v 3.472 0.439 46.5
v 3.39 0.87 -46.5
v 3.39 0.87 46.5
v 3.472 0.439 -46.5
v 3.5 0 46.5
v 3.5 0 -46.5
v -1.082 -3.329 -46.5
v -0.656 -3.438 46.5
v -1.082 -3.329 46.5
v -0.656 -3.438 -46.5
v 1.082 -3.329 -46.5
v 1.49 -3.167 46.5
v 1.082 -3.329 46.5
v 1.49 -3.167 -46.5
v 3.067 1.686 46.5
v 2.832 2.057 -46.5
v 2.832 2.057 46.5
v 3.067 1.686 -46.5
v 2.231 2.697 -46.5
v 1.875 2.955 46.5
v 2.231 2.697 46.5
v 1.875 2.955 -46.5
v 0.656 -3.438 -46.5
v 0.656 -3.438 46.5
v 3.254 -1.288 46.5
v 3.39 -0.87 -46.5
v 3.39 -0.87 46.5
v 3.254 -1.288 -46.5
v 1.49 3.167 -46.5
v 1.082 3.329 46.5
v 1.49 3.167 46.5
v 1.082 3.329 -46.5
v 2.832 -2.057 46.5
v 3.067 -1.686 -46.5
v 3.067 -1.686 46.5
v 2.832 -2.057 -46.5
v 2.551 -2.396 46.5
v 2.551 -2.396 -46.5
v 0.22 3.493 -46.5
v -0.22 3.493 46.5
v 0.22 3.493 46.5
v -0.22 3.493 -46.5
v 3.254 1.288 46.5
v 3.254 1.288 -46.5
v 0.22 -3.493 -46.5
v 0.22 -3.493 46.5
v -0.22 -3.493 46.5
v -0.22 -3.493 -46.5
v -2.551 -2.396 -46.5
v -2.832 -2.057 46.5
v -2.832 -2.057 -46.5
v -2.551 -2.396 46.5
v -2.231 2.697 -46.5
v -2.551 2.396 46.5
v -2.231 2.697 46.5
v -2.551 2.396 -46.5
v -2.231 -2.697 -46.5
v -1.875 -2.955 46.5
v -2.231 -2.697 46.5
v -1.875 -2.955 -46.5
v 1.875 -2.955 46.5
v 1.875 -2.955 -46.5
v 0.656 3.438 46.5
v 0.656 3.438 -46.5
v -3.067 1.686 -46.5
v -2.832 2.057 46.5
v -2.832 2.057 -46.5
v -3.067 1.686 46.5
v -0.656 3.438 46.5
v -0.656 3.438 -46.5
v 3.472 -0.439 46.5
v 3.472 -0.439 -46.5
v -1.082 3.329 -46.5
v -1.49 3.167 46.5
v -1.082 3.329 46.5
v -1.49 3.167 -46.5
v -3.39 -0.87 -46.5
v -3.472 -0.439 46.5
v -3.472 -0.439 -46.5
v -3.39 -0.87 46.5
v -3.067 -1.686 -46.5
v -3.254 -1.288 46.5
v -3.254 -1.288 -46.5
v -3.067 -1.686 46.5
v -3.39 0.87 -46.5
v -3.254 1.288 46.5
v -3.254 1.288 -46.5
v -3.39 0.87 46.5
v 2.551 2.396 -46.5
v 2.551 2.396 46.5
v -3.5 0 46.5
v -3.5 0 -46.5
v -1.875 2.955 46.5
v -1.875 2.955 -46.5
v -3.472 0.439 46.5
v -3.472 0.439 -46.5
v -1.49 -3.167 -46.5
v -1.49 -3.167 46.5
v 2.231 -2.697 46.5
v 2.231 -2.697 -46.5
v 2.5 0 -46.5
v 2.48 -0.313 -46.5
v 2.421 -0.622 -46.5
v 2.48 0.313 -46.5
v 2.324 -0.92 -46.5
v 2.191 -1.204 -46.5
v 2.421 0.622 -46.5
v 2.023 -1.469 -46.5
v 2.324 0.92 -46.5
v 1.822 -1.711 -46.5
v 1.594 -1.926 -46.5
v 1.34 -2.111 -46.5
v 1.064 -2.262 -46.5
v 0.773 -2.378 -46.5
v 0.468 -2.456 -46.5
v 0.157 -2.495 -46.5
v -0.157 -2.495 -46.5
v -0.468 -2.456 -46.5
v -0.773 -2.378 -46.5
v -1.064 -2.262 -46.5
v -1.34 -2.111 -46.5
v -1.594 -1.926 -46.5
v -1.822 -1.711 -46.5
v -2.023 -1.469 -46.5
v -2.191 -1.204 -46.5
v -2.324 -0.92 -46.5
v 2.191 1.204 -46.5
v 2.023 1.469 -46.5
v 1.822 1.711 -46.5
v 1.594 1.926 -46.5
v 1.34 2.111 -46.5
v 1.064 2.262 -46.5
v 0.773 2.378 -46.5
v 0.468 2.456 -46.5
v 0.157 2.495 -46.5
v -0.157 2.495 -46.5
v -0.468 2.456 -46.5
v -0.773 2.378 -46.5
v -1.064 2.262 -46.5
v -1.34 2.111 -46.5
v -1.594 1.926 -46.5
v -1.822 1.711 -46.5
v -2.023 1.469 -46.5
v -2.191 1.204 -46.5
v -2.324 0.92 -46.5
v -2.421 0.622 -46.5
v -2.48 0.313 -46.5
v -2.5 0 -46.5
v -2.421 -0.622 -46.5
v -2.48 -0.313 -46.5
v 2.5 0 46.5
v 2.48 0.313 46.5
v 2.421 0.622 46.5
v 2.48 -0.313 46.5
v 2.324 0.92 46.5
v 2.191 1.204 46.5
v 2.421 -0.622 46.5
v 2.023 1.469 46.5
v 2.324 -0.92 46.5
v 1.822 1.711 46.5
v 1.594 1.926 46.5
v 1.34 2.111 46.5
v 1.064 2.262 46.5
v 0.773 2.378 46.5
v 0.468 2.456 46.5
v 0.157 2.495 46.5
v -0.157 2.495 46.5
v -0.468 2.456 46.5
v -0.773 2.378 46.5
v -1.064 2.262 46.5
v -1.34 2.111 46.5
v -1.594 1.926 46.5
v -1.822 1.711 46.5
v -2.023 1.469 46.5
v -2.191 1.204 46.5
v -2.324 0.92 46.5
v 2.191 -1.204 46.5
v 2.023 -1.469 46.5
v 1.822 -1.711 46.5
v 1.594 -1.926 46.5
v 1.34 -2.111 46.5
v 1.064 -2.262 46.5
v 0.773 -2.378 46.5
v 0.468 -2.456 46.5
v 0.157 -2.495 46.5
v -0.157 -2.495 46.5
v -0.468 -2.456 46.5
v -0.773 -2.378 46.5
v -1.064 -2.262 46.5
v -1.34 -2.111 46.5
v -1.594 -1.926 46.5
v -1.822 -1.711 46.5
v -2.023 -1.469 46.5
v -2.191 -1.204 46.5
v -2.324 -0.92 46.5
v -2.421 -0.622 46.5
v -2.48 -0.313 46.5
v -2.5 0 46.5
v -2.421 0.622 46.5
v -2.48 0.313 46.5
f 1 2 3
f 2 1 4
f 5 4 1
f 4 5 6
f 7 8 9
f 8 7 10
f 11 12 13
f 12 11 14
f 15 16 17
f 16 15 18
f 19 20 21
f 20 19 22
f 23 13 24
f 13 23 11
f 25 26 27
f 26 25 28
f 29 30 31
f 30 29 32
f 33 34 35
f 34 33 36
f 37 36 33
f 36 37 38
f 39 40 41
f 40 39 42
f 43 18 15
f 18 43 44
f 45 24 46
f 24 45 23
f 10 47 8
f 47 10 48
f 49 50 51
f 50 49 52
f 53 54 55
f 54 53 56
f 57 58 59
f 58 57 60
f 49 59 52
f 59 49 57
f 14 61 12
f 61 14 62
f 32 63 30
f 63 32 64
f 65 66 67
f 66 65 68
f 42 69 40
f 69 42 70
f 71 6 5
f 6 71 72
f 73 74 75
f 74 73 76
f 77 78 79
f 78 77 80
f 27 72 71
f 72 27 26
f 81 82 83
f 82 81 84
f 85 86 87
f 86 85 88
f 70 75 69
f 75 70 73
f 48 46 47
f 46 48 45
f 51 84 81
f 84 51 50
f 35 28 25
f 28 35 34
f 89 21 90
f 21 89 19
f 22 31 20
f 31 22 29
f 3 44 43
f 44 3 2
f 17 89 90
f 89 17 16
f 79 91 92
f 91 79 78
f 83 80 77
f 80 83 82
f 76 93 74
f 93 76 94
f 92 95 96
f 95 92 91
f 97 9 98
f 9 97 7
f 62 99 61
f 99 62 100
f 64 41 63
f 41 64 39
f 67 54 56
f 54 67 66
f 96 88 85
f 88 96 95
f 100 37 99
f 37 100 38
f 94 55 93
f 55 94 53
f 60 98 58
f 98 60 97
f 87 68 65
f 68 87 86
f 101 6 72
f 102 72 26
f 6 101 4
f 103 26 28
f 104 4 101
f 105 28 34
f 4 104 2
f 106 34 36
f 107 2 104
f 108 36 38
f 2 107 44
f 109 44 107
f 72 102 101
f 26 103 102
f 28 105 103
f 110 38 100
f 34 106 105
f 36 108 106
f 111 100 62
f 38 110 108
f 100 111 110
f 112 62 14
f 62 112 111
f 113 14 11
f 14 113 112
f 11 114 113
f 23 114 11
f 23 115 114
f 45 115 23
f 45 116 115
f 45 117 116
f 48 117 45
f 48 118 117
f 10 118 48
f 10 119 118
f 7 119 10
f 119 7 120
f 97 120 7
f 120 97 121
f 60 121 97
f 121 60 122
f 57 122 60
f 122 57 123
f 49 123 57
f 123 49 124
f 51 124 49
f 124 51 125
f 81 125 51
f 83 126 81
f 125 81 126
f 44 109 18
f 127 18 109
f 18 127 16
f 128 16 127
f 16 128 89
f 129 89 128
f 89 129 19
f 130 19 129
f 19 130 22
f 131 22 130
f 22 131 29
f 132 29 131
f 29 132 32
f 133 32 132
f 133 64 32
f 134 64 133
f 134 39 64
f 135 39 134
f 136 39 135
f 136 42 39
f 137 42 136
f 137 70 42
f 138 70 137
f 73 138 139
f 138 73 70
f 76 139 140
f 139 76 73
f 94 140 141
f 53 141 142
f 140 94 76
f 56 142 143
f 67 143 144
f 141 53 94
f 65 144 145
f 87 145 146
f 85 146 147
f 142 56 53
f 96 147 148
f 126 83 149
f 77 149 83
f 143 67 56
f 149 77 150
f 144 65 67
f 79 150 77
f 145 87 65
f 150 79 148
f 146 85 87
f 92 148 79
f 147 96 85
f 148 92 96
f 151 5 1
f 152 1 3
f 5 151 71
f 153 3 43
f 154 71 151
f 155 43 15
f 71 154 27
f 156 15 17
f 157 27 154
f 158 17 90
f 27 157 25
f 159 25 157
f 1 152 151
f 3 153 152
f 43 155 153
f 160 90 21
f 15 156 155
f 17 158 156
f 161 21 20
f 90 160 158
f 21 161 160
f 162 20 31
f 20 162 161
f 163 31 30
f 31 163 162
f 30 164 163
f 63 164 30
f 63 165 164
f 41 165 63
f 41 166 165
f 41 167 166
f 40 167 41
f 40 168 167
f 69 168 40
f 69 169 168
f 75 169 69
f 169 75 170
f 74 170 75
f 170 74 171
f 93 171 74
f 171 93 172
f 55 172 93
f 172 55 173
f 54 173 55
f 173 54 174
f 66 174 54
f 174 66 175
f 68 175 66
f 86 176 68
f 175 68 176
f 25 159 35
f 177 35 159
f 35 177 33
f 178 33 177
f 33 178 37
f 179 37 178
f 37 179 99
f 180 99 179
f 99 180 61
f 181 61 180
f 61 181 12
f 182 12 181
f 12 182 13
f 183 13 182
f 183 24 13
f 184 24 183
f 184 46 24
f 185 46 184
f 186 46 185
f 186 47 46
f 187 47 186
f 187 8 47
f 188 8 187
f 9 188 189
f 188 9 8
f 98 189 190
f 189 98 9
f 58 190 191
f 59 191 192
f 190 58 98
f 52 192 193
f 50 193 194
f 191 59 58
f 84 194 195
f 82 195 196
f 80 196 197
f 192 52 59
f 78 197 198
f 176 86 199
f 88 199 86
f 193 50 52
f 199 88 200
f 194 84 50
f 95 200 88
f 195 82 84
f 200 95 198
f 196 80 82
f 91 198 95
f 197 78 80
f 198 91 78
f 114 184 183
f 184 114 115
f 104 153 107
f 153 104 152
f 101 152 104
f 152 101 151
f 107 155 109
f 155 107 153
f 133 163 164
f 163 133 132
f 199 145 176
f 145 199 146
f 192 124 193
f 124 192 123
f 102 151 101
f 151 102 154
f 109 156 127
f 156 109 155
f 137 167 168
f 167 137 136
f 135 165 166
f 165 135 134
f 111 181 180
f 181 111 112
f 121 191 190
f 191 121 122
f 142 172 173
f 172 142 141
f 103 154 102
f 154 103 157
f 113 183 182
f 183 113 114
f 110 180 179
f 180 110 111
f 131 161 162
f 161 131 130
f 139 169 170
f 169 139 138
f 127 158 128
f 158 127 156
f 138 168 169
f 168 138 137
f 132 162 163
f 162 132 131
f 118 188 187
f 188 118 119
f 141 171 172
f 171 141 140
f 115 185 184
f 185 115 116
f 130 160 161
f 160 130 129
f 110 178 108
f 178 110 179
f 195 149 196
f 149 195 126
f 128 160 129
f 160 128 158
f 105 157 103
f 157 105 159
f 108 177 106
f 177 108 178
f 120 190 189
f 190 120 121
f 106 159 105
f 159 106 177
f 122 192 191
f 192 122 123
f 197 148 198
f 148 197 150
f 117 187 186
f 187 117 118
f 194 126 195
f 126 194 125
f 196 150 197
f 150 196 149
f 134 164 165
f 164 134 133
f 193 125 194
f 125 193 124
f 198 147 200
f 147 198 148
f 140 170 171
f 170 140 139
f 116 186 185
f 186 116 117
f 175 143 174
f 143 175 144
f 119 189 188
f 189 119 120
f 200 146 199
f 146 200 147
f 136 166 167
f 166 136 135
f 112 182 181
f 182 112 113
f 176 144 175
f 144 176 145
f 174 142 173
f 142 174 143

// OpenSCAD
$fn = 50;


difference() {
	union() {
		translate(v = [0, 0, -46.5000000000]) {
			cylinder(h = 93, r = 3.5000000000);
		}
	}
	union() {
		translate(v = [0, 0, -100.0000000000]) {
			cylinder(h = 200, r = 2.5000000000);
		}
	}
}
